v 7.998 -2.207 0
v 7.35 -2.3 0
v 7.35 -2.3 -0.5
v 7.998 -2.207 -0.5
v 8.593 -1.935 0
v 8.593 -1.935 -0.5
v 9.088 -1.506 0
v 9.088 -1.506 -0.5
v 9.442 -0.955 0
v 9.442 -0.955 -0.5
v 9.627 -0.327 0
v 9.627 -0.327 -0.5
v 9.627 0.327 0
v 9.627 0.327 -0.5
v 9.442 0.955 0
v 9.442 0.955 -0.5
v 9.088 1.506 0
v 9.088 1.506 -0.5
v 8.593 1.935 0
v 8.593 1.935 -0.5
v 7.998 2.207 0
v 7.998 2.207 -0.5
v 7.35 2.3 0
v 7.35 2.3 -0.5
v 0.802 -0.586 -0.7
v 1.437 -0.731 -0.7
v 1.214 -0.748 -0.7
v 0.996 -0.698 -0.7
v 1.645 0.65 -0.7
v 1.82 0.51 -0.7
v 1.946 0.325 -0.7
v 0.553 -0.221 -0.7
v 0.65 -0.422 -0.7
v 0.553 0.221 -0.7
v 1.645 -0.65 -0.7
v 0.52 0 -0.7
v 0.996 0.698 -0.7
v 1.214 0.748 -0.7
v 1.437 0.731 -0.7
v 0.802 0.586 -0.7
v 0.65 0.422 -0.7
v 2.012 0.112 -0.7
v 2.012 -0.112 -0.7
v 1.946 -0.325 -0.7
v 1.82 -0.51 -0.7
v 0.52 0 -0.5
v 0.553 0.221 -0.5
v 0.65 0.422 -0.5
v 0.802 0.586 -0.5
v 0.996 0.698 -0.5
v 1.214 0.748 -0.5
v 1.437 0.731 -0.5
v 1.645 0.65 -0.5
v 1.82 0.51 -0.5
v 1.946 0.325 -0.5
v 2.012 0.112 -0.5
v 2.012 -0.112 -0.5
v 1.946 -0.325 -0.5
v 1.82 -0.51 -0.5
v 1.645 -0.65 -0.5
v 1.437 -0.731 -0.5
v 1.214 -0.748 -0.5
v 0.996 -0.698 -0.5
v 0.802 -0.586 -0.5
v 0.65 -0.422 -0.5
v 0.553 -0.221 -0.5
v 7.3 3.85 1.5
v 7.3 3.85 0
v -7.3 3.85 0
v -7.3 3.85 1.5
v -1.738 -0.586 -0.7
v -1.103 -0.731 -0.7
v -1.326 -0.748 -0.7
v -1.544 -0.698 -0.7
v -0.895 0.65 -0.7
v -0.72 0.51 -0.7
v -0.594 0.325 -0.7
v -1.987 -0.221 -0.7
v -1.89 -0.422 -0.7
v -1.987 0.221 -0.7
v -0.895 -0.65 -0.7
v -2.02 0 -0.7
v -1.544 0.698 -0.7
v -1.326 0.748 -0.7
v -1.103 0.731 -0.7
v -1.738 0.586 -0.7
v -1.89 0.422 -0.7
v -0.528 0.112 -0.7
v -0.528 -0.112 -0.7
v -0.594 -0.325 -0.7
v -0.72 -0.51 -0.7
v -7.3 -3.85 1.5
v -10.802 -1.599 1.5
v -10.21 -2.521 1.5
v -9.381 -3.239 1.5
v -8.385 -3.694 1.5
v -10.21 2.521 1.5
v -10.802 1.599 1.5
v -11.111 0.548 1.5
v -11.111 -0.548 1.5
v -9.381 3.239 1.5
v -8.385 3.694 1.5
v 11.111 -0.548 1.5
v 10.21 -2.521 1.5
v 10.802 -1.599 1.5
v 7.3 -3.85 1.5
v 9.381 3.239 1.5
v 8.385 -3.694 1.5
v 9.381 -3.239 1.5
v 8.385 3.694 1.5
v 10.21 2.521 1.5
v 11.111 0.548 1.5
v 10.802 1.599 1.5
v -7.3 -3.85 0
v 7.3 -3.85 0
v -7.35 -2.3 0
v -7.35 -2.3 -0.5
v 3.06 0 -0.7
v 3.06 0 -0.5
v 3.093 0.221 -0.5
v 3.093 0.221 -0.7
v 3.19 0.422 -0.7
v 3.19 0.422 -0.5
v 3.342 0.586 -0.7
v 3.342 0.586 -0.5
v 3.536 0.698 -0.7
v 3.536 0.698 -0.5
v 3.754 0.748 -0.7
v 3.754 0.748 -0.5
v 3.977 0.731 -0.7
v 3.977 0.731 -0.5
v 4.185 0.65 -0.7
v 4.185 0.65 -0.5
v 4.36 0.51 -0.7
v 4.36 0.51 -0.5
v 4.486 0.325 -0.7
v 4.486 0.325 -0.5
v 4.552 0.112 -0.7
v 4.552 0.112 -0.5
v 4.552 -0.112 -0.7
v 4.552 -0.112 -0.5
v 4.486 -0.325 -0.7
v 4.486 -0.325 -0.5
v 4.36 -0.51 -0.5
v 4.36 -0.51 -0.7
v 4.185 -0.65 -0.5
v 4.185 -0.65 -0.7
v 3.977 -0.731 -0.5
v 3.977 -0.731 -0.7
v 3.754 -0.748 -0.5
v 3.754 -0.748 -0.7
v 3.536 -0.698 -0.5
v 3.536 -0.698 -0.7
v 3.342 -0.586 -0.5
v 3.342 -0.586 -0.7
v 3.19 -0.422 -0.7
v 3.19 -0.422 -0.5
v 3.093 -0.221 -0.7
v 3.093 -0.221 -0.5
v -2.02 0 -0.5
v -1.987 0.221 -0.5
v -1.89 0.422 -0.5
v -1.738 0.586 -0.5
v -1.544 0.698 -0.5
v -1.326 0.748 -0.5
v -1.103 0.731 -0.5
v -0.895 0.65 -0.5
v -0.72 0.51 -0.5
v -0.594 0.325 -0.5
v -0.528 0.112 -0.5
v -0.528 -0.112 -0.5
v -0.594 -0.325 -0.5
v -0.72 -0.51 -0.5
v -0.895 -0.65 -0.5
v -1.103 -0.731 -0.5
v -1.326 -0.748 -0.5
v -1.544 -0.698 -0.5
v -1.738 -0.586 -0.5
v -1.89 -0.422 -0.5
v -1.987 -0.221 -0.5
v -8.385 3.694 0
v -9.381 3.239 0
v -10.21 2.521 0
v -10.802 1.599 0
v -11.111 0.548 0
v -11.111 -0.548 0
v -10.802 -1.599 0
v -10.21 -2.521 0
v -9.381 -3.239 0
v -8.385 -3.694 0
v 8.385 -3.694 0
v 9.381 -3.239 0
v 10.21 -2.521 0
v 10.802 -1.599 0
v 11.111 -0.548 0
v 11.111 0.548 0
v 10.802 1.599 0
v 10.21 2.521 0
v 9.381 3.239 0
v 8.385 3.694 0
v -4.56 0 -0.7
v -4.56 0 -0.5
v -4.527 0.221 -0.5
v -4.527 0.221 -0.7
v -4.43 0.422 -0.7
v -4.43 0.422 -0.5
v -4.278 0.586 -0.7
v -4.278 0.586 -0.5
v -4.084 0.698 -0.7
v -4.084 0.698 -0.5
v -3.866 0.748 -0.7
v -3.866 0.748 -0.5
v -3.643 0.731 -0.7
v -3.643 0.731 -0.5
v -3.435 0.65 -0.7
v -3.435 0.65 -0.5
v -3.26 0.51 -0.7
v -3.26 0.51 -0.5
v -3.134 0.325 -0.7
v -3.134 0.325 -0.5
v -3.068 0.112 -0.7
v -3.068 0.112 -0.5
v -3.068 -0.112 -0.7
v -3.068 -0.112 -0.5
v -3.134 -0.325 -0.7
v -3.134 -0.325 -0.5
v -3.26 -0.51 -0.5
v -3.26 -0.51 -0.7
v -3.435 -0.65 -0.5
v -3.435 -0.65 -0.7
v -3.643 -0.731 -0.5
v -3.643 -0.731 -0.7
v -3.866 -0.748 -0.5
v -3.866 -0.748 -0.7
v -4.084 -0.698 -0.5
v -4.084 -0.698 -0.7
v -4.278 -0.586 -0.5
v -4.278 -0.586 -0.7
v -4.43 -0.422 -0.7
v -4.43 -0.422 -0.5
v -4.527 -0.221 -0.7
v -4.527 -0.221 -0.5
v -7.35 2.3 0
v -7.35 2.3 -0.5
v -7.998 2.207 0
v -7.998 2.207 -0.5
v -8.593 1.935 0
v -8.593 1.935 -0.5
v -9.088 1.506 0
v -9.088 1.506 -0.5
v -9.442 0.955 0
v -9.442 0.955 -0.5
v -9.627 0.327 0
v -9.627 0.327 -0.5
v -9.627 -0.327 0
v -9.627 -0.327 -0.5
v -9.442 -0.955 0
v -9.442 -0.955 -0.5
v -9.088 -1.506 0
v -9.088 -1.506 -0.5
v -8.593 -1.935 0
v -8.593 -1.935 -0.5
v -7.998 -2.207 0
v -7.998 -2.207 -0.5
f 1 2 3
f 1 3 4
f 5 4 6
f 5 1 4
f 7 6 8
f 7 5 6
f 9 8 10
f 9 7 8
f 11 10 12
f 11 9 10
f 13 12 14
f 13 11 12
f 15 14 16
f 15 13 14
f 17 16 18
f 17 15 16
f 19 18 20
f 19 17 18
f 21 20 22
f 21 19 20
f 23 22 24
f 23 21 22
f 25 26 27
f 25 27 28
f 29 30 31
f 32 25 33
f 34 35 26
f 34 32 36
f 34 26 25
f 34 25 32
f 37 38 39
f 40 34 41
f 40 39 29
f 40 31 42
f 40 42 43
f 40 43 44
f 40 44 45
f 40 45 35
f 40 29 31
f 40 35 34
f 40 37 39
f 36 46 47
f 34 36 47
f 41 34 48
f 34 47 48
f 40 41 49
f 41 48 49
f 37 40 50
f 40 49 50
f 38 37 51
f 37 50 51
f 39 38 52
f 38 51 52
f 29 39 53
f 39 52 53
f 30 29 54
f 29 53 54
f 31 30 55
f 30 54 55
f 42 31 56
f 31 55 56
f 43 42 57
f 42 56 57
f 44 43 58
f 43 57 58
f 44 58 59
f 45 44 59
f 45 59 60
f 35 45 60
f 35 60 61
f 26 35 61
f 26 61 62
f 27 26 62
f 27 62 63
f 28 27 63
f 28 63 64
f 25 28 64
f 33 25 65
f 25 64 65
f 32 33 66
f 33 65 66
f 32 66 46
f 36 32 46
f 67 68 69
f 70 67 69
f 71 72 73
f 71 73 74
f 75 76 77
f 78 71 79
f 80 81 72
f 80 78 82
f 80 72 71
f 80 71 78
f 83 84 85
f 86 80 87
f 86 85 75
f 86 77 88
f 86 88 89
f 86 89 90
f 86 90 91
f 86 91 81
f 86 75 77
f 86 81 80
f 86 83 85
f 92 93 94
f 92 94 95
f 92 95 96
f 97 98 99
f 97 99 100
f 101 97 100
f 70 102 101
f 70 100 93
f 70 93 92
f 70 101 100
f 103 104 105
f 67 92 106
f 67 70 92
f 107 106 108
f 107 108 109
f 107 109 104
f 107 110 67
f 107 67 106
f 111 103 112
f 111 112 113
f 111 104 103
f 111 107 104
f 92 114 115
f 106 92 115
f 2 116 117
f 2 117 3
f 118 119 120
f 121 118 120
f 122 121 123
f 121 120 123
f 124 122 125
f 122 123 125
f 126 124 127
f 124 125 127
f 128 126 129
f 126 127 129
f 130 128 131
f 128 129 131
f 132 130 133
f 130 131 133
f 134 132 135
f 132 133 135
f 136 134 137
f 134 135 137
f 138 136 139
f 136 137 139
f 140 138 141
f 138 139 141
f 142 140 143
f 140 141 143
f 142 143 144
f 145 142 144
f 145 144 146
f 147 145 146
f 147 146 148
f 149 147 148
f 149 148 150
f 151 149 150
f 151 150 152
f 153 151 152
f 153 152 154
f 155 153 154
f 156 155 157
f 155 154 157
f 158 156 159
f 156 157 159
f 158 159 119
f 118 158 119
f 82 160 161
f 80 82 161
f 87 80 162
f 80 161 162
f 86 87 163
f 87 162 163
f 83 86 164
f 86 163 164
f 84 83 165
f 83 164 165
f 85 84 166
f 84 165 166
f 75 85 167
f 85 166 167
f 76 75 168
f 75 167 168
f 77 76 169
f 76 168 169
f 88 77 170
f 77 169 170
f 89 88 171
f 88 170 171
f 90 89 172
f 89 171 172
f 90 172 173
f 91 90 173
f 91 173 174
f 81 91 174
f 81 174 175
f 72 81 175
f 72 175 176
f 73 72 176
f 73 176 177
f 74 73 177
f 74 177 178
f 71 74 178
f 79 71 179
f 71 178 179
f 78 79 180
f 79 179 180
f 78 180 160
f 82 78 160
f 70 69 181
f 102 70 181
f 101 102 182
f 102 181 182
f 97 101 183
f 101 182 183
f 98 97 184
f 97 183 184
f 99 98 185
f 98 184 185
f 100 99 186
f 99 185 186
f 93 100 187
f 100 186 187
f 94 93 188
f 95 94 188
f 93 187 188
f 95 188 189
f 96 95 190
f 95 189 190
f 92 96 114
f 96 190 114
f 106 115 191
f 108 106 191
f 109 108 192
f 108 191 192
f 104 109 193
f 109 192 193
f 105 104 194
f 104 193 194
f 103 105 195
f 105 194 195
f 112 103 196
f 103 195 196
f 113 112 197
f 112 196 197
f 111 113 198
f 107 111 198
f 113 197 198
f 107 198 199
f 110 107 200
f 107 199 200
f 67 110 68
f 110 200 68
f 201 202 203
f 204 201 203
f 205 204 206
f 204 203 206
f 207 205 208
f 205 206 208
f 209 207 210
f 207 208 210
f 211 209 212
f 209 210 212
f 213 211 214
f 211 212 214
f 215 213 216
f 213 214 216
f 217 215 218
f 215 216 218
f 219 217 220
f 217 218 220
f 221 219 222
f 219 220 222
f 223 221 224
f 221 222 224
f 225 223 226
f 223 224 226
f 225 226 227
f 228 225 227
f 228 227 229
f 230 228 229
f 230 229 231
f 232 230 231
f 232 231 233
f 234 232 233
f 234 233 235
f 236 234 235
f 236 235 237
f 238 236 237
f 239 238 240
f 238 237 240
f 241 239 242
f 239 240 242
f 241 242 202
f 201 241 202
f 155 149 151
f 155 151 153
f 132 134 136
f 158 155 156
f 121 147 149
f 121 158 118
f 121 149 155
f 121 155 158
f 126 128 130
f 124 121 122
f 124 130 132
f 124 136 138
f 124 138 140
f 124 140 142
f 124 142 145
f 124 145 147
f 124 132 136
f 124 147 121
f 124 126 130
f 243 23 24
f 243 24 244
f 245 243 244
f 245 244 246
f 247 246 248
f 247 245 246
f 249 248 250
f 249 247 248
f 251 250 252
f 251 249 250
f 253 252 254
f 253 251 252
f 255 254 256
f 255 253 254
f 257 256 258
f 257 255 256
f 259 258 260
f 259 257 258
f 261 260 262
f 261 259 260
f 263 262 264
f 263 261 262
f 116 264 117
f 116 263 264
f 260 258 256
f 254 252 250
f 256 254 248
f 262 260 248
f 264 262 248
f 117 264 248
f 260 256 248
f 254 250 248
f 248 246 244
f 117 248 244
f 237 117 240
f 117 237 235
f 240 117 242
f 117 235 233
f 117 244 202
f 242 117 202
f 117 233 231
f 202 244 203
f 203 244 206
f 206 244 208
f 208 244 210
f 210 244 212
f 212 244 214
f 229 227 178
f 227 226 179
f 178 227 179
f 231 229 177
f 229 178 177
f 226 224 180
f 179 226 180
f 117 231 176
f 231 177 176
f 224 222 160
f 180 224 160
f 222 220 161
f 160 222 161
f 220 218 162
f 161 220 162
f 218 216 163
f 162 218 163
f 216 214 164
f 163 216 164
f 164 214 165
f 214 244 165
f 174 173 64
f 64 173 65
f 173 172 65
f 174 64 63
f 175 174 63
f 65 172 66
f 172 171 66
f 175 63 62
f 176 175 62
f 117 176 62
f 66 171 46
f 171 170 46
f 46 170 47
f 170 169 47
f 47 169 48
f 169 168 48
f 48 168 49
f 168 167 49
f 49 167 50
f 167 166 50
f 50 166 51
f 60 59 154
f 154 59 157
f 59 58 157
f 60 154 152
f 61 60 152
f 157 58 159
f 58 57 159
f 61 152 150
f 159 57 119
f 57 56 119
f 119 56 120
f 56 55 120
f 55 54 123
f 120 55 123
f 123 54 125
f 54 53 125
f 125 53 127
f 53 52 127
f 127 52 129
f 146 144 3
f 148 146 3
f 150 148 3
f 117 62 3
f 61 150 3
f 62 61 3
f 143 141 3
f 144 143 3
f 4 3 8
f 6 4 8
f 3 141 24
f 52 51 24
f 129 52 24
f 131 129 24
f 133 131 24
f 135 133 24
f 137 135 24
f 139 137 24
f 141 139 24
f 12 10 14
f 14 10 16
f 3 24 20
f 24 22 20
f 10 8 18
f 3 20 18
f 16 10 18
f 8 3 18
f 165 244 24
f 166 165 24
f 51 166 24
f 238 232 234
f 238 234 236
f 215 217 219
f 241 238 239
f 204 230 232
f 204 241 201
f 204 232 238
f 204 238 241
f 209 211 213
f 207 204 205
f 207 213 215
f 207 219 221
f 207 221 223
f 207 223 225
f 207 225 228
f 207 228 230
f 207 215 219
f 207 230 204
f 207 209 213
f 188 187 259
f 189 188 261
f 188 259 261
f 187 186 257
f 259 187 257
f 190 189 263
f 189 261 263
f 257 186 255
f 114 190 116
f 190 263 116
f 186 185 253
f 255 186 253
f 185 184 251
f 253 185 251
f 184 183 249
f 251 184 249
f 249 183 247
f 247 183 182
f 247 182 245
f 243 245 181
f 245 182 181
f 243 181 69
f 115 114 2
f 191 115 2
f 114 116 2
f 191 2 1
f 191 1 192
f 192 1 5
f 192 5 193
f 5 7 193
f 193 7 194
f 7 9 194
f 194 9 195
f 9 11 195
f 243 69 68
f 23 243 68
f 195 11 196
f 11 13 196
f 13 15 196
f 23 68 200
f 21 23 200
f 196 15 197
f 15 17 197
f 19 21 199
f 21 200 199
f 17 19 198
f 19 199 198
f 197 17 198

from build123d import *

# Parameters (mm, degrees)
EXTRUDE_1_DEPTH = 1.5
EXTRUDE_2_DEPTH = 0.5
SKETCH_3_R      = 0.75
EXTRUDE_3_DEPTH = 0.2


with BuildPart() as part:
    # 草图1 → 凸台-拉伸1 (new body)
    with BuildSketch(Plane.XY):
        with BuildLine():
            Line((7.3, 3.85), (-7.3, 3.85))
            ThreePointArc((-7.3, 3.85), (-11.15, 0), (-7.3, -3.85))
            Line((-7.3, -3.85), (7.3, -3.85))
            ThreePointArc((7.3, -3.85), (11.15, 0), (7.3, 3.85))
        make_face()
    extrude(amount=EXTRUDE_1_DEPTH)

    # 草图2 → 凸台-拉伸2 (add)
    with BuildSketch(Plane(origin=(0, 0, 0), x_dir=(-1, 0, 0), z_dir=(0, 0, -1))):
        with BuildLine():
            Line((-7.35, 2.3), (7.35, 2.3))
            ThreePointArc((7.35, 2.3), (9.65, 0), (7.35, -2.3))
            Line((7.35, -2.3), (-7.35, -2.3))
            ThreePointArc((-7.35, -2.3), (-9.65, 0), (-7.35, 2.3))
        make_face()
    extrude(amount=EXTRUDE_2_DEPTH)

    # 草图3 → 凸台-拉伸3 (add)
    with BuildSketch(Plane(origin=(0, 0, -0.5), x_dir=(-1, 0, 0), z_dir=(0, 0, -1))):
        with Locations((1.27, 0)):
            Circle(SKETCH_3_R)
        with Locations((3.81, 0)):
            Circle(SKETCH_3_R)
        with Locations((-3.81, 0)):
            Circle(SKETCH_3_R)
        with Locations((-1.27, 0)):
            Circle(SKETCH_3_R)
    extrude(amount=EXTRUDE_3_DEPTH)


solid = part.part
